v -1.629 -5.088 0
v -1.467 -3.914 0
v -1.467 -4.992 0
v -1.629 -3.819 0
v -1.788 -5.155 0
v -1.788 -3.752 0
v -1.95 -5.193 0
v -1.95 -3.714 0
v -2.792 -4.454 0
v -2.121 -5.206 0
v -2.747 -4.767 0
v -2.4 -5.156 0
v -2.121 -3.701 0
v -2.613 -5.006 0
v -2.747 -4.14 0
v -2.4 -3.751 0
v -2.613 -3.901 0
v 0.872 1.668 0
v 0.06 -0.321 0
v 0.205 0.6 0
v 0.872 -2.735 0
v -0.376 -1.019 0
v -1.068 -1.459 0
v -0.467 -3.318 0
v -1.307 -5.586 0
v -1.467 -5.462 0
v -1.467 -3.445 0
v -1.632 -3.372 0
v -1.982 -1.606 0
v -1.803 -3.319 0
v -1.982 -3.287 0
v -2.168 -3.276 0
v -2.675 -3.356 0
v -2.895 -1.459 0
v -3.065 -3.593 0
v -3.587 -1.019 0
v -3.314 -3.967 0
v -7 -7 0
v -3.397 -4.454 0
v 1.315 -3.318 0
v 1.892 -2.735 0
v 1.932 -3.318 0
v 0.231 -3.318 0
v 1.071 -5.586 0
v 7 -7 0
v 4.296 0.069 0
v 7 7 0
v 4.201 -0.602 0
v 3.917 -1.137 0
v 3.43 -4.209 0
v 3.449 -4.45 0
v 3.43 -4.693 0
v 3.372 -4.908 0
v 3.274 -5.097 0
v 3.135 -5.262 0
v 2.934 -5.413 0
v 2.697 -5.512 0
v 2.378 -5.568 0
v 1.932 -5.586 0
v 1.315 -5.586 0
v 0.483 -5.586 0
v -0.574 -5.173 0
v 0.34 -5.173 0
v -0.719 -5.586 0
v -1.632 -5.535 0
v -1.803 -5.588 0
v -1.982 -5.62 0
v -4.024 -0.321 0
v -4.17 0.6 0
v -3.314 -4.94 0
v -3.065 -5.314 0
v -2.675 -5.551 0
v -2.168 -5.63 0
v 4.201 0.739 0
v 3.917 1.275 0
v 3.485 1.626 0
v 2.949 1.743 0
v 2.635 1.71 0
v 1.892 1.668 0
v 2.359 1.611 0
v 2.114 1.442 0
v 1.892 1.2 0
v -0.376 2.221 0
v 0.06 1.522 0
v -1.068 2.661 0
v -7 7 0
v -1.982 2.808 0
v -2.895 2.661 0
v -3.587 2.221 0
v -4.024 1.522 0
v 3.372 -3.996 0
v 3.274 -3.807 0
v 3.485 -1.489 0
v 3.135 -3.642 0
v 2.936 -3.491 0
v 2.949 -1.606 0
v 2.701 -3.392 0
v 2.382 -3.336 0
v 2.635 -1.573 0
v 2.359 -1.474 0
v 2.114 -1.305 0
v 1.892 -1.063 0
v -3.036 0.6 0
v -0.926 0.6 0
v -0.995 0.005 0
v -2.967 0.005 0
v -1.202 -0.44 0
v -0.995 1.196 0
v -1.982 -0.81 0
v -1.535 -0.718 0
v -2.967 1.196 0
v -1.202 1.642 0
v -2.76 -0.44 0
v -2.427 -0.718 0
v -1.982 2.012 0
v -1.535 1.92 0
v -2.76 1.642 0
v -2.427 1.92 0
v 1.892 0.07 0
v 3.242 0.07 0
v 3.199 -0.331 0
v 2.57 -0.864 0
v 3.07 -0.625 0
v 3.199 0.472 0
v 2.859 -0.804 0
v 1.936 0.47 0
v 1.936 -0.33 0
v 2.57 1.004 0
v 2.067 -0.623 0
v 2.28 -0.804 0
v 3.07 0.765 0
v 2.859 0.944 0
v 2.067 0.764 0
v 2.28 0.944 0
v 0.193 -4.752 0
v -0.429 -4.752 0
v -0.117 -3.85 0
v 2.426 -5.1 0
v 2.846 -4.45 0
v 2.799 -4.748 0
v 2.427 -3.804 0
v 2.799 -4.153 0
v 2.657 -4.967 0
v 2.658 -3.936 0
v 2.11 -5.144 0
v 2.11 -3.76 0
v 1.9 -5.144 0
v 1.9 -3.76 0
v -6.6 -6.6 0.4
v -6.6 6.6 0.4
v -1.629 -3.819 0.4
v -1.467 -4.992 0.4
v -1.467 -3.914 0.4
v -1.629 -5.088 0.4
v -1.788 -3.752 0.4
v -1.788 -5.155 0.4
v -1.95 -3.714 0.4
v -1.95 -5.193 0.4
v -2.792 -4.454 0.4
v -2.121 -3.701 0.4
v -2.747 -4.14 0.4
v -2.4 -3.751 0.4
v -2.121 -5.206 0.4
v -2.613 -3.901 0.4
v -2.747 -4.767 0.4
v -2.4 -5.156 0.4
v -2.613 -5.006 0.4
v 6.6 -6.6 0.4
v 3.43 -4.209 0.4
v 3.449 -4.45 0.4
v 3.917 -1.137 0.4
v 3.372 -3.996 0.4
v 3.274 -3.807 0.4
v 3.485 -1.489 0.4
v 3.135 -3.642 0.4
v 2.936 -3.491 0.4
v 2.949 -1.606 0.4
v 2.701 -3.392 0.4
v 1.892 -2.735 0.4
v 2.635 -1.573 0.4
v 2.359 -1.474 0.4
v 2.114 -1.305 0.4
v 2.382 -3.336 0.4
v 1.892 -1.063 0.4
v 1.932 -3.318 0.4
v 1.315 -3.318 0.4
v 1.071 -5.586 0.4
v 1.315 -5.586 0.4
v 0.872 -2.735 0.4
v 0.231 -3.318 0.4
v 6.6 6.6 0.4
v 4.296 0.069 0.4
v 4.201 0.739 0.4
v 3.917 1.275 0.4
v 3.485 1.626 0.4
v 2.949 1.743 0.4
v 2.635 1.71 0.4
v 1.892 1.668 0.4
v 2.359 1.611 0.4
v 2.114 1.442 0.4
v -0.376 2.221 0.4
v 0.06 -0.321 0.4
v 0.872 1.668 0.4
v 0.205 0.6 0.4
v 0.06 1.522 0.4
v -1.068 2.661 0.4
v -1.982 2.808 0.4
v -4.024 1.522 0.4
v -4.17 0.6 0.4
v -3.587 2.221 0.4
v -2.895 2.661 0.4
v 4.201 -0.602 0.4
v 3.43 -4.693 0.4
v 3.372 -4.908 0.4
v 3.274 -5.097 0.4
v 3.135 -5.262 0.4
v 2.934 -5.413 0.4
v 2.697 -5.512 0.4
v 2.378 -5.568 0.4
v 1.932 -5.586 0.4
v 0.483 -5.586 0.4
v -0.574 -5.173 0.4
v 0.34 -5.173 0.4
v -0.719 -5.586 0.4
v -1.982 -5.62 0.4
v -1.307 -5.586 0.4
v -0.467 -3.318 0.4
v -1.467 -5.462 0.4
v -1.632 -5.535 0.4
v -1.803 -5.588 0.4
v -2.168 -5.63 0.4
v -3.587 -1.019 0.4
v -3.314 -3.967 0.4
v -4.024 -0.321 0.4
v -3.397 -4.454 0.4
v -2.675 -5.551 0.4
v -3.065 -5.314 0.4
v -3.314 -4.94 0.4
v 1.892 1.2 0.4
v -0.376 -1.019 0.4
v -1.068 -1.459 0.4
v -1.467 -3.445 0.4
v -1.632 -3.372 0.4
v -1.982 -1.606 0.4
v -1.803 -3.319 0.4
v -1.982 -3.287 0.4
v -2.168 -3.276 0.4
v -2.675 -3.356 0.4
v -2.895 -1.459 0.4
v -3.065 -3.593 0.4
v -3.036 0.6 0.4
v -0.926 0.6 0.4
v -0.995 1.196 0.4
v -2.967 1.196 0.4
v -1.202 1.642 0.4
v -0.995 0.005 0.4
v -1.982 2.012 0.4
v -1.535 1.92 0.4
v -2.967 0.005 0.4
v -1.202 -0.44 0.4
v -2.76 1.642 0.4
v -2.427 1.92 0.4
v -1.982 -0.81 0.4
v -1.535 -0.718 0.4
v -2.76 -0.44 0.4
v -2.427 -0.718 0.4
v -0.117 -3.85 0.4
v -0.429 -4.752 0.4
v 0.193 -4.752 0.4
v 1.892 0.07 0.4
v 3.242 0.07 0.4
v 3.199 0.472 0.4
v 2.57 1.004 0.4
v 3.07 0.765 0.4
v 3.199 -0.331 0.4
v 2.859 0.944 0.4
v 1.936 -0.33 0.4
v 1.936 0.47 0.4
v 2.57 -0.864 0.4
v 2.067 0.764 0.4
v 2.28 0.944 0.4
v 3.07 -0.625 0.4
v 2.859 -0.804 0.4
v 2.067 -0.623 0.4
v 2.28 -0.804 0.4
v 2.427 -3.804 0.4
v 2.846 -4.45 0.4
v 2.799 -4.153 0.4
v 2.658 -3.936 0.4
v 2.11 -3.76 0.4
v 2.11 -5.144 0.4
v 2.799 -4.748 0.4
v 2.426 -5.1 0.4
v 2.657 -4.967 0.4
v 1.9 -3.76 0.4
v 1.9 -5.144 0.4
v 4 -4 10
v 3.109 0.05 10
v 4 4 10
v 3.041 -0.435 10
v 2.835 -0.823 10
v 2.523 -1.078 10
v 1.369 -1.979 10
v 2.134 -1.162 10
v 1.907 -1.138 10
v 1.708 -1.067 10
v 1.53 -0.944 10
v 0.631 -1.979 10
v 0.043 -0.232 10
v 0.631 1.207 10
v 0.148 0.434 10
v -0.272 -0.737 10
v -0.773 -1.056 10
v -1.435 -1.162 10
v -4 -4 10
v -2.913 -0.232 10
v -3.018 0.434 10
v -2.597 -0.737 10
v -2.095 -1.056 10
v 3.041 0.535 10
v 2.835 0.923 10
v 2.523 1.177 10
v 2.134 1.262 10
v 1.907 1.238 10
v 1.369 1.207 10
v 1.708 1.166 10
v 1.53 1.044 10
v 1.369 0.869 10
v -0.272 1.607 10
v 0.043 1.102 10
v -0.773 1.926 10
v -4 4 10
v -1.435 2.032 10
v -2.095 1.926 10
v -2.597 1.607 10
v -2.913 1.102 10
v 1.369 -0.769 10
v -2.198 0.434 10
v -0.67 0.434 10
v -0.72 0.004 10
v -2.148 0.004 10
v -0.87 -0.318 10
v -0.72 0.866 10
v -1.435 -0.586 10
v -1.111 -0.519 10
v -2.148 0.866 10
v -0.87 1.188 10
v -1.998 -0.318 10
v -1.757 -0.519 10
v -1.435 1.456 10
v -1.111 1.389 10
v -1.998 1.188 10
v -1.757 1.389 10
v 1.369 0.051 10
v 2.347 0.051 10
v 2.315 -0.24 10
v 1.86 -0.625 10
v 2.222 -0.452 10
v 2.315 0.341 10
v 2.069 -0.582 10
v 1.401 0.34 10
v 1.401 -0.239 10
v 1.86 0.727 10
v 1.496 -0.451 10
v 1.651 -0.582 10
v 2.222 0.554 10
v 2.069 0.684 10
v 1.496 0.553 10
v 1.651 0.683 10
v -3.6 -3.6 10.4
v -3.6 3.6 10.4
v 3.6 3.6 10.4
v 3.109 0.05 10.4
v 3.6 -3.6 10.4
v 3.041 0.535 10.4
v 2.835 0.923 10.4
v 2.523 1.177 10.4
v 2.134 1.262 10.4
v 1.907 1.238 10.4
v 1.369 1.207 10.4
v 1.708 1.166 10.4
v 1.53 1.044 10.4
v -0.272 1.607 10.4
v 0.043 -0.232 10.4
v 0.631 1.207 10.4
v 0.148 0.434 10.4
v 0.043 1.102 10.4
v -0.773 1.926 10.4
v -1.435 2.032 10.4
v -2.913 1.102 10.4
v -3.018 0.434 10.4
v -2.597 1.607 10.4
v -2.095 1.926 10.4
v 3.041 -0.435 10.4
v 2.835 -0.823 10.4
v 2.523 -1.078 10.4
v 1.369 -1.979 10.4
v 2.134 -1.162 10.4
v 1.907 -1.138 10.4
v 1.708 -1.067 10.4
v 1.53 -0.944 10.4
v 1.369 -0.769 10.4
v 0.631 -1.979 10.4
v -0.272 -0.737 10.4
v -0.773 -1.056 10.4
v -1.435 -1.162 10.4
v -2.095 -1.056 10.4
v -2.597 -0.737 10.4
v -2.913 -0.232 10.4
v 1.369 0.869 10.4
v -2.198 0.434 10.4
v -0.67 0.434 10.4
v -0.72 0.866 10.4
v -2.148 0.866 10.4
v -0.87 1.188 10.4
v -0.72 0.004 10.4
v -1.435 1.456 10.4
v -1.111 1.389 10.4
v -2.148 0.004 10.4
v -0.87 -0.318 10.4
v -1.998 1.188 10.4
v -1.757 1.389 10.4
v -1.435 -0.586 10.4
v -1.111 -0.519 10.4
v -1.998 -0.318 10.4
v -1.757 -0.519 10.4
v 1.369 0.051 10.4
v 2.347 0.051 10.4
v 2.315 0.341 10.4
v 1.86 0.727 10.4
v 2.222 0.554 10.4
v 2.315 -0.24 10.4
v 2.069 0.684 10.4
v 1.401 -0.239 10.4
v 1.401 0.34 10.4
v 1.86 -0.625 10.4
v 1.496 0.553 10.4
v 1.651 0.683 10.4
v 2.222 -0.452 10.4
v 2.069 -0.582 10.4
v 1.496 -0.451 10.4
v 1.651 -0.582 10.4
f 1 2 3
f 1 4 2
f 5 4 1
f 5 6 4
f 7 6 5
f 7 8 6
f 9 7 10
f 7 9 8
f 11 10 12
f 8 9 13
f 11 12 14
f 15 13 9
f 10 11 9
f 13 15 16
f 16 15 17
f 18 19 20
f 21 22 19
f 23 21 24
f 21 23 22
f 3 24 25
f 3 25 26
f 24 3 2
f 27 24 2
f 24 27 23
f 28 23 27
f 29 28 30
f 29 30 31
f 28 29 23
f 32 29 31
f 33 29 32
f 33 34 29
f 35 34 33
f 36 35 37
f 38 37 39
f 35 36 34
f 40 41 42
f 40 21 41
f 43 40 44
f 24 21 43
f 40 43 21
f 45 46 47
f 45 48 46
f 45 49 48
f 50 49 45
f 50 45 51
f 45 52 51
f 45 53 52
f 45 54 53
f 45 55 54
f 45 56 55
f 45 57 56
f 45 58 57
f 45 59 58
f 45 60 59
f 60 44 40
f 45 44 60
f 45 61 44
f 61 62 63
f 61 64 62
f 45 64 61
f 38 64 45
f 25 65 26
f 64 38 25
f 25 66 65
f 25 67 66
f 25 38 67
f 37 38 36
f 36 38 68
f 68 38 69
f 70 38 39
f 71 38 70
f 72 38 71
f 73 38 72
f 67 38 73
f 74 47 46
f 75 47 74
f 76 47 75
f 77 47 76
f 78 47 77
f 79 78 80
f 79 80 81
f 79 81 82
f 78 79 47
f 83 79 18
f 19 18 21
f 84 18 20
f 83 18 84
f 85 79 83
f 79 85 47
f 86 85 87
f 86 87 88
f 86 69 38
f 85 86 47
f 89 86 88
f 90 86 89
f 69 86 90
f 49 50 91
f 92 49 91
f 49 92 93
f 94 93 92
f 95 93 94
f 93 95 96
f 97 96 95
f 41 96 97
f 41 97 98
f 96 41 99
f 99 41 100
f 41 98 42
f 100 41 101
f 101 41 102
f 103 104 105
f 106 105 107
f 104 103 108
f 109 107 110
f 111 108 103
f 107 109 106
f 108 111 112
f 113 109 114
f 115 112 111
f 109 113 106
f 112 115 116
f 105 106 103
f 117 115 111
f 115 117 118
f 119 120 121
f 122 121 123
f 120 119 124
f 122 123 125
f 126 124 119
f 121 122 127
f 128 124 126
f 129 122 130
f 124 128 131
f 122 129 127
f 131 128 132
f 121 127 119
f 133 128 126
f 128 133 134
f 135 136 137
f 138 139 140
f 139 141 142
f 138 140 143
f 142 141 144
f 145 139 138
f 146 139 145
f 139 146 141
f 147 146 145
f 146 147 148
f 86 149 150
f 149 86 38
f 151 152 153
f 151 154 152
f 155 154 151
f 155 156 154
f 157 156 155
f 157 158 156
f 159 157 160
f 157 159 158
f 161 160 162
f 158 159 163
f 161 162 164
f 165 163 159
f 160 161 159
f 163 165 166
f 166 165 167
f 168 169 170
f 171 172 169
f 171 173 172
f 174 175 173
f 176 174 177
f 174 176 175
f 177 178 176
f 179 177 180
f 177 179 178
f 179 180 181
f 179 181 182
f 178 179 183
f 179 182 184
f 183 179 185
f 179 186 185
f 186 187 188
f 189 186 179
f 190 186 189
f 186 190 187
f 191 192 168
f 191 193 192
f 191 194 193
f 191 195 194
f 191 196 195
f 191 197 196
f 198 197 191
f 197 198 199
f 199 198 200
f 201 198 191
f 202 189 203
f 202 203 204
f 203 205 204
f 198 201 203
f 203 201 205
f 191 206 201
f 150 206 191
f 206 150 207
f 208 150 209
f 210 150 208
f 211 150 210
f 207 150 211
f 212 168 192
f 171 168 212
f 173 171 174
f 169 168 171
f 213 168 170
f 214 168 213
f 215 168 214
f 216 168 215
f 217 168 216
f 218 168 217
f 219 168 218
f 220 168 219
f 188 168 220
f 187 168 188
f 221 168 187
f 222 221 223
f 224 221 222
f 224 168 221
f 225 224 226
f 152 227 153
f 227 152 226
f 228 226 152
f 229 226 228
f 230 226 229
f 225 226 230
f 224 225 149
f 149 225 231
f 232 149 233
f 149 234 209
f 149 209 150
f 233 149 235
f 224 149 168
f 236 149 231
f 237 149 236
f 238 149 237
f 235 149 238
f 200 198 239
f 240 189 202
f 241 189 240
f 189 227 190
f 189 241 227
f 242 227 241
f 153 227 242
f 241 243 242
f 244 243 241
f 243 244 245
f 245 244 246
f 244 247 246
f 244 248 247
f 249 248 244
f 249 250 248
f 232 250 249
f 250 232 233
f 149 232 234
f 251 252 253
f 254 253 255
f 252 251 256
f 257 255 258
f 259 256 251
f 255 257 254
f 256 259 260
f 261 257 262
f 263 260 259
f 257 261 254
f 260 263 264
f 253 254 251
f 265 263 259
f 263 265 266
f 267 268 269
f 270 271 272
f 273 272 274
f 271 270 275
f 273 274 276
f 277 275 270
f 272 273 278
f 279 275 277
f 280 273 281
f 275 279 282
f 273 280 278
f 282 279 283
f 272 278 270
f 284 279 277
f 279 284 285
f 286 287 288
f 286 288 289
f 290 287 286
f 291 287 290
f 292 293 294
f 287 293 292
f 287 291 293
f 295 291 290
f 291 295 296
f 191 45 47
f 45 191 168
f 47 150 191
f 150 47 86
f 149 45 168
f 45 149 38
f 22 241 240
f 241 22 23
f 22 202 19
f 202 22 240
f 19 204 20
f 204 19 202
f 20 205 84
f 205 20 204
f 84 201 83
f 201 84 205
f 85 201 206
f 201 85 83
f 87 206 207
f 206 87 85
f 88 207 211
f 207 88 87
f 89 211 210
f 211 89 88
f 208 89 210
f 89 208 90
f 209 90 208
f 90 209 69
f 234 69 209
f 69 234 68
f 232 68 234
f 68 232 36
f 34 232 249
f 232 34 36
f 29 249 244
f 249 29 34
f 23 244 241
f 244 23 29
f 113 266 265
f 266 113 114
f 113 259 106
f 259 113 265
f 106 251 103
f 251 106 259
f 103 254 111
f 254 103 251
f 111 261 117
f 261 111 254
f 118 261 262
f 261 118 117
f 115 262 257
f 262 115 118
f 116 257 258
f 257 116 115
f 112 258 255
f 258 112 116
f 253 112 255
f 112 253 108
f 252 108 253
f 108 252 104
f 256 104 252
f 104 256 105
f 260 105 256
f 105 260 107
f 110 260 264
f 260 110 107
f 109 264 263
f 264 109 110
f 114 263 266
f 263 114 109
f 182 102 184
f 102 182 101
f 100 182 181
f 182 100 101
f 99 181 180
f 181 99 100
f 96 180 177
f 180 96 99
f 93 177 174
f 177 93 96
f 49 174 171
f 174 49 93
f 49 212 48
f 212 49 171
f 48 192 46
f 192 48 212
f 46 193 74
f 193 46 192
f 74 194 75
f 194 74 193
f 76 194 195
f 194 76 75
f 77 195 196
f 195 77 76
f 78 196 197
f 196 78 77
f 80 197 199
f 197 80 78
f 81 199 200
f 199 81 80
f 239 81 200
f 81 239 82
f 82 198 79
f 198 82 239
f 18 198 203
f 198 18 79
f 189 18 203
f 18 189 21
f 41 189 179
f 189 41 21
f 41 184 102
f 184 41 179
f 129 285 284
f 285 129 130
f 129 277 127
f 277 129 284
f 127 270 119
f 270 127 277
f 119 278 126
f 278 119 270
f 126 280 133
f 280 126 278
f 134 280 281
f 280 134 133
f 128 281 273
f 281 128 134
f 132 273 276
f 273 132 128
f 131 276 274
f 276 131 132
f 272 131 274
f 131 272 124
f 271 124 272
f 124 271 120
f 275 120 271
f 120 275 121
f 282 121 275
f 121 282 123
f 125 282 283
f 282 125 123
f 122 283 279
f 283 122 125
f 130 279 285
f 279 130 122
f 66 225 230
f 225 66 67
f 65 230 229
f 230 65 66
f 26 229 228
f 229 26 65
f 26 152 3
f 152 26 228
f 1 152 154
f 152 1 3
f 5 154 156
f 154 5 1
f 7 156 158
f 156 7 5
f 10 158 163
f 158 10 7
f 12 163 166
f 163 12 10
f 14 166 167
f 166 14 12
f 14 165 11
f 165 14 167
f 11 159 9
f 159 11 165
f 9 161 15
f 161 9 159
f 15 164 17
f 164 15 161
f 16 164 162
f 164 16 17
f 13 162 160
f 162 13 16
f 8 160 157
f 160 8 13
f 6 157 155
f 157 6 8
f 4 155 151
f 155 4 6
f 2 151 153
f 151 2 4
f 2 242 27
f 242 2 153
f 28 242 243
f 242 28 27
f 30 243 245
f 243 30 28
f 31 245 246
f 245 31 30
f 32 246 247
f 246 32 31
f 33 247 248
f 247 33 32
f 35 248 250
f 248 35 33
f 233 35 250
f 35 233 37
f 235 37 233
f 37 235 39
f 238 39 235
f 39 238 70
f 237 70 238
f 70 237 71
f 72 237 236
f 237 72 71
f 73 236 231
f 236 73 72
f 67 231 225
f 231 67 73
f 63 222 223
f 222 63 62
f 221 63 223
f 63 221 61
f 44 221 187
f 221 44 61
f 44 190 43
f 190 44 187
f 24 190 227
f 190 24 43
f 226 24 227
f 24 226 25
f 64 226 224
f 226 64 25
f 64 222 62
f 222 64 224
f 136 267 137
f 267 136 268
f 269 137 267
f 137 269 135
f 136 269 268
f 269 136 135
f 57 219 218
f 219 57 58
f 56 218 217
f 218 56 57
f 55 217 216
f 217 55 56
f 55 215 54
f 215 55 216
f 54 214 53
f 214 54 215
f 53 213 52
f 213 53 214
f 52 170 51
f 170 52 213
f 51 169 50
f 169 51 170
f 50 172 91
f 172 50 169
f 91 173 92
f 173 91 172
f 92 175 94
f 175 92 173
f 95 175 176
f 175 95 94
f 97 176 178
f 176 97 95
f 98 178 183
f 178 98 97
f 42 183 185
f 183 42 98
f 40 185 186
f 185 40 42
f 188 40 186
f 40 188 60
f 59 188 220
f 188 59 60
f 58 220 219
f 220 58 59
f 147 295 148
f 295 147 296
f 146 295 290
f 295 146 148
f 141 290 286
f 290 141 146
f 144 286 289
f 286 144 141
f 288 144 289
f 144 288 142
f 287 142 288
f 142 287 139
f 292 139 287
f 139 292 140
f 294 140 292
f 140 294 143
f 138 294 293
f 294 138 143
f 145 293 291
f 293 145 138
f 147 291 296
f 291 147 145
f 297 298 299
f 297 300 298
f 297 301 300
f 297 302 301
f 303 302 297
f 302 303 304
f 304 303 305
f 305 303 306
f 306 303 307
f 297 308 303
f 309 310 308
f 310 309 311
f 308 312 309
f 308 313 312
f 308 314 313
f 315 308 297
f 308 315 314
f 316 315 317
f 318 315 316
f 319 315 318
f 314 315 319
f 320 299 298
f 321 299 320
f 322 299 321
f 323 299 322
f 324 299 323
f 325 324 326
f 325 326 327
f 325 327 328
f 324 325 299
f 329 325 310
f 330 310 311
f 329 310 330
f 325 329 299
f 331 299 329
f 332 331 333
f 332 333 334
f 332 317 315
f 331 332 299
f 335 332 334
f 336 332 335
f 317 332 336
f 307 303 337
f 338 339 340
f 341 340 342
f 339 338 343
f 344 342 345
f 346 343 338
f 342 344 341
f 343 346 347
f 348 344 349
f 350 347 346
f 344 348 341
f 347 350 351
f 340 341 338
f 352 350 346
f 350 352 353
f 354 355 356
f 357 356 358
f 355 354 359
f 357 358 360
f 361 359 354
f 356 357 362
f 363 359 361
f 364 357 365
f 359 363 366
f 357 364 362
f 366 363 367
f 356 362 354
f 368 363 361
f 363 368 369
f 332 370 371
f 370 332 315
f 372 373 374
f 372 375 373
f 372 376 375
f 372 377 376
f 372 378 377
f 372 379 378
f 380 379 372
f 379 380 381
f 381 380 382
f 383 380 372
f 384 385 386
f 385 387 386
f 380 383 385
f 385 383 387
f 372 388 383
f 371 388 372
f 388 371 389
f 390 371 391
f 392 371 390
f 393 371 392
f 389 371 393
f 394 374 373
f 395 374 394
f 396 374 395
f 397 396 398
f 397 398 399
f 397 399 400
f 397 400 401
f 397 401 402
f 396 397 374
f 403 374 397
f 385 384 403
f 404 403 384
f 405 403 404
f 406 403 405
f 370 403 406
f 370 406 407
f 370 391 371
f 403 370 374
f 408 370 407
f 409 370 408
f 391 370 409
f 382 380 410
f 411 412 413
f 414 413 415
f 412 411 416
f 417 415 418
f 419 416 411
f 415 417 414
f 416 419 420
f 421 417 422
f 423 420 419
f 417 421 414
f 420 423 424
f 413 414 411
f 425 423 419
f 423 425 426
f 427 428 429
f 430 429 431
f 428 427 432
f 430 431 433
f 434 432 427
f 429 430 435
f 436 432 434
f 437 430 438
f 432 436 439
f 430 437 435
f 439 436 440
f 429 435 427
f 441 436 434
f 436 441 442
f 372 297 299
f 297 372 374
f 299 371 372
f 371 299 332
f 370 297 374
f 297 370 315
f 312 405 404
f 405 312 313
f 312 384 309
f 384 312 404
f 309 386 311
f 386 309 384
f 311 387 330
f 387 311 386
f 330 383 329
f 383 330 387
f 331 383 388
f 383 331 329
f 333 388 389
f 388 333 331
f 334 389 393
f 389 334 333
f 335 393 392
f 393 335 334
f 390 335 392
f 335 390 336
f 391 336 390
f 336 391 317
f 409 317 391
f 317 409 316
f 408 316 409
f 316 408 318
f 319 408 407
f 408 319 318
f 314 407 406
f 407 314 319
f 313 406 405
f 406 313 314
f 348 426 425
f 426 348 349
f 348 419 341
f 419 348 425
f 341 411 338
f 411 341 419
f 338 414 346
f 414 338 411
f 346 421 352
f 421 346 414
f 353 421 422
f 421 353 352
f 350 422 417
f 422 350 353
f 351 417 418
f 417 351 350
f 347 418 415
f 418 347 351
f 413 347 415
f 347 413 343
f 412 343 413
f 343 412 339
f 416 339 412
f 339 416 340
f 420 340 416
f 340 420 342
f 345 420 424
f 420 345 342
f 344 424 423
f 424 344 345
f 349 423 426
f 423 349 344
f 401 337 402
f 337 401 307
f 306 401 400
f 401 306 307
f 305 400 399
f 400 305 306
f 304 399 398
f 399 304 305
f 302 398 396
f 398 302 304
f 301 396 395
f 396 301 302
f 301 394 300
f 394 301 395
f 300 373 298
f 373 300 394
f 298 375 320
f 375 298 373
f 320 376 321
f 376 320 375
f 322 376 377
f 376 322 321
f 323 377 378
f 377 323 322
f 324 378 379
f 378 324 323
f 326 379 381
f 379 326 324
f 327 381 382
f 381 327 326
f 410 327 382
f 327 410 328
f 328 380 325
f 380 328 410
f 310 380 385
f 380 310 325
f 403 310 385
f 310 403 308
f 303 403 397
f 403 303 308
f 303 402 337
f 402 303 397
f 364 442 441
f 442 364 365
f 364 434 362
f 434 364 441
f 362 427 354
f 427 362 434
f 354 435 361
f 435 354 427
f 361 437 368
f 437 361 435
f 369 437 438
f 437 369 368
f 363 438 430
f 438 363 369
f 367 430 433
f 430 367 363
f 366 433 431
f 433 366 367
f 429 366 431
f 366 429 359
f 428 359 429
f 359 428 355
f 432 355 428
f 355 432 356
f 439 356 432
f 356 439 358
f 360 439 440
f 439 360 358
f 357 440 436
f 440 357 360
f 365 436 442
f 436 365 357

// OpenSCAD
// Full opcadnium logo
// xyscale - lateral dimension
// h - height, positive for emboss, negative for engrave
module logo(xyscale=12, h=0.4,
    font="DejaVu Sans:Bold") {
    dz = (h>0) ? 0 : h;
    ah = abs(h);
    w1 = (h>0) ? xyscale : xyscale-2*ah;
    s = ((xyscale-h*2)/xyscale);
    translate([0, 0, dz]) difference() {
        linear_extrude(ah, scale=s)
        square(w1, center=true);
        linear_extrude(ah+.05) {
            text("Op", size=0.3*xyscale, halign="center", valign="center", font=font);
            translate([0, -.32*xyscale])
            text("CAD", size=0.16*xyscale, halign="center", valign="center", font=font);
        }
    }
}

// Partial opcadnium logo
// xyscale - lateral dimension
// h - height, positive for emboss, negative for engrave
module logo_small(xyscale=12, h=0.4,
    font="DejaVu Sans:Bold") {
    dz = (h>0) ? 0 : h;
    ah = abs(h);
    w1 = (h>0) ? xyscale : xyscale-2*ah;
    s = ((xyscale-h*2)/xyscale);
    translate([0, 0, dz]) difference() {
        linear_extrude(ah, scale=s)
        square(w1, center=true);
        linear_extrude(ah+.05)
        text("Op", size=0.38*xyscale, halign="center", valign="center", font=font);
    }
}

logo(xyscale=14, h=.4);

translate([0, 0, 10])
logo_small(xyscale=8);
